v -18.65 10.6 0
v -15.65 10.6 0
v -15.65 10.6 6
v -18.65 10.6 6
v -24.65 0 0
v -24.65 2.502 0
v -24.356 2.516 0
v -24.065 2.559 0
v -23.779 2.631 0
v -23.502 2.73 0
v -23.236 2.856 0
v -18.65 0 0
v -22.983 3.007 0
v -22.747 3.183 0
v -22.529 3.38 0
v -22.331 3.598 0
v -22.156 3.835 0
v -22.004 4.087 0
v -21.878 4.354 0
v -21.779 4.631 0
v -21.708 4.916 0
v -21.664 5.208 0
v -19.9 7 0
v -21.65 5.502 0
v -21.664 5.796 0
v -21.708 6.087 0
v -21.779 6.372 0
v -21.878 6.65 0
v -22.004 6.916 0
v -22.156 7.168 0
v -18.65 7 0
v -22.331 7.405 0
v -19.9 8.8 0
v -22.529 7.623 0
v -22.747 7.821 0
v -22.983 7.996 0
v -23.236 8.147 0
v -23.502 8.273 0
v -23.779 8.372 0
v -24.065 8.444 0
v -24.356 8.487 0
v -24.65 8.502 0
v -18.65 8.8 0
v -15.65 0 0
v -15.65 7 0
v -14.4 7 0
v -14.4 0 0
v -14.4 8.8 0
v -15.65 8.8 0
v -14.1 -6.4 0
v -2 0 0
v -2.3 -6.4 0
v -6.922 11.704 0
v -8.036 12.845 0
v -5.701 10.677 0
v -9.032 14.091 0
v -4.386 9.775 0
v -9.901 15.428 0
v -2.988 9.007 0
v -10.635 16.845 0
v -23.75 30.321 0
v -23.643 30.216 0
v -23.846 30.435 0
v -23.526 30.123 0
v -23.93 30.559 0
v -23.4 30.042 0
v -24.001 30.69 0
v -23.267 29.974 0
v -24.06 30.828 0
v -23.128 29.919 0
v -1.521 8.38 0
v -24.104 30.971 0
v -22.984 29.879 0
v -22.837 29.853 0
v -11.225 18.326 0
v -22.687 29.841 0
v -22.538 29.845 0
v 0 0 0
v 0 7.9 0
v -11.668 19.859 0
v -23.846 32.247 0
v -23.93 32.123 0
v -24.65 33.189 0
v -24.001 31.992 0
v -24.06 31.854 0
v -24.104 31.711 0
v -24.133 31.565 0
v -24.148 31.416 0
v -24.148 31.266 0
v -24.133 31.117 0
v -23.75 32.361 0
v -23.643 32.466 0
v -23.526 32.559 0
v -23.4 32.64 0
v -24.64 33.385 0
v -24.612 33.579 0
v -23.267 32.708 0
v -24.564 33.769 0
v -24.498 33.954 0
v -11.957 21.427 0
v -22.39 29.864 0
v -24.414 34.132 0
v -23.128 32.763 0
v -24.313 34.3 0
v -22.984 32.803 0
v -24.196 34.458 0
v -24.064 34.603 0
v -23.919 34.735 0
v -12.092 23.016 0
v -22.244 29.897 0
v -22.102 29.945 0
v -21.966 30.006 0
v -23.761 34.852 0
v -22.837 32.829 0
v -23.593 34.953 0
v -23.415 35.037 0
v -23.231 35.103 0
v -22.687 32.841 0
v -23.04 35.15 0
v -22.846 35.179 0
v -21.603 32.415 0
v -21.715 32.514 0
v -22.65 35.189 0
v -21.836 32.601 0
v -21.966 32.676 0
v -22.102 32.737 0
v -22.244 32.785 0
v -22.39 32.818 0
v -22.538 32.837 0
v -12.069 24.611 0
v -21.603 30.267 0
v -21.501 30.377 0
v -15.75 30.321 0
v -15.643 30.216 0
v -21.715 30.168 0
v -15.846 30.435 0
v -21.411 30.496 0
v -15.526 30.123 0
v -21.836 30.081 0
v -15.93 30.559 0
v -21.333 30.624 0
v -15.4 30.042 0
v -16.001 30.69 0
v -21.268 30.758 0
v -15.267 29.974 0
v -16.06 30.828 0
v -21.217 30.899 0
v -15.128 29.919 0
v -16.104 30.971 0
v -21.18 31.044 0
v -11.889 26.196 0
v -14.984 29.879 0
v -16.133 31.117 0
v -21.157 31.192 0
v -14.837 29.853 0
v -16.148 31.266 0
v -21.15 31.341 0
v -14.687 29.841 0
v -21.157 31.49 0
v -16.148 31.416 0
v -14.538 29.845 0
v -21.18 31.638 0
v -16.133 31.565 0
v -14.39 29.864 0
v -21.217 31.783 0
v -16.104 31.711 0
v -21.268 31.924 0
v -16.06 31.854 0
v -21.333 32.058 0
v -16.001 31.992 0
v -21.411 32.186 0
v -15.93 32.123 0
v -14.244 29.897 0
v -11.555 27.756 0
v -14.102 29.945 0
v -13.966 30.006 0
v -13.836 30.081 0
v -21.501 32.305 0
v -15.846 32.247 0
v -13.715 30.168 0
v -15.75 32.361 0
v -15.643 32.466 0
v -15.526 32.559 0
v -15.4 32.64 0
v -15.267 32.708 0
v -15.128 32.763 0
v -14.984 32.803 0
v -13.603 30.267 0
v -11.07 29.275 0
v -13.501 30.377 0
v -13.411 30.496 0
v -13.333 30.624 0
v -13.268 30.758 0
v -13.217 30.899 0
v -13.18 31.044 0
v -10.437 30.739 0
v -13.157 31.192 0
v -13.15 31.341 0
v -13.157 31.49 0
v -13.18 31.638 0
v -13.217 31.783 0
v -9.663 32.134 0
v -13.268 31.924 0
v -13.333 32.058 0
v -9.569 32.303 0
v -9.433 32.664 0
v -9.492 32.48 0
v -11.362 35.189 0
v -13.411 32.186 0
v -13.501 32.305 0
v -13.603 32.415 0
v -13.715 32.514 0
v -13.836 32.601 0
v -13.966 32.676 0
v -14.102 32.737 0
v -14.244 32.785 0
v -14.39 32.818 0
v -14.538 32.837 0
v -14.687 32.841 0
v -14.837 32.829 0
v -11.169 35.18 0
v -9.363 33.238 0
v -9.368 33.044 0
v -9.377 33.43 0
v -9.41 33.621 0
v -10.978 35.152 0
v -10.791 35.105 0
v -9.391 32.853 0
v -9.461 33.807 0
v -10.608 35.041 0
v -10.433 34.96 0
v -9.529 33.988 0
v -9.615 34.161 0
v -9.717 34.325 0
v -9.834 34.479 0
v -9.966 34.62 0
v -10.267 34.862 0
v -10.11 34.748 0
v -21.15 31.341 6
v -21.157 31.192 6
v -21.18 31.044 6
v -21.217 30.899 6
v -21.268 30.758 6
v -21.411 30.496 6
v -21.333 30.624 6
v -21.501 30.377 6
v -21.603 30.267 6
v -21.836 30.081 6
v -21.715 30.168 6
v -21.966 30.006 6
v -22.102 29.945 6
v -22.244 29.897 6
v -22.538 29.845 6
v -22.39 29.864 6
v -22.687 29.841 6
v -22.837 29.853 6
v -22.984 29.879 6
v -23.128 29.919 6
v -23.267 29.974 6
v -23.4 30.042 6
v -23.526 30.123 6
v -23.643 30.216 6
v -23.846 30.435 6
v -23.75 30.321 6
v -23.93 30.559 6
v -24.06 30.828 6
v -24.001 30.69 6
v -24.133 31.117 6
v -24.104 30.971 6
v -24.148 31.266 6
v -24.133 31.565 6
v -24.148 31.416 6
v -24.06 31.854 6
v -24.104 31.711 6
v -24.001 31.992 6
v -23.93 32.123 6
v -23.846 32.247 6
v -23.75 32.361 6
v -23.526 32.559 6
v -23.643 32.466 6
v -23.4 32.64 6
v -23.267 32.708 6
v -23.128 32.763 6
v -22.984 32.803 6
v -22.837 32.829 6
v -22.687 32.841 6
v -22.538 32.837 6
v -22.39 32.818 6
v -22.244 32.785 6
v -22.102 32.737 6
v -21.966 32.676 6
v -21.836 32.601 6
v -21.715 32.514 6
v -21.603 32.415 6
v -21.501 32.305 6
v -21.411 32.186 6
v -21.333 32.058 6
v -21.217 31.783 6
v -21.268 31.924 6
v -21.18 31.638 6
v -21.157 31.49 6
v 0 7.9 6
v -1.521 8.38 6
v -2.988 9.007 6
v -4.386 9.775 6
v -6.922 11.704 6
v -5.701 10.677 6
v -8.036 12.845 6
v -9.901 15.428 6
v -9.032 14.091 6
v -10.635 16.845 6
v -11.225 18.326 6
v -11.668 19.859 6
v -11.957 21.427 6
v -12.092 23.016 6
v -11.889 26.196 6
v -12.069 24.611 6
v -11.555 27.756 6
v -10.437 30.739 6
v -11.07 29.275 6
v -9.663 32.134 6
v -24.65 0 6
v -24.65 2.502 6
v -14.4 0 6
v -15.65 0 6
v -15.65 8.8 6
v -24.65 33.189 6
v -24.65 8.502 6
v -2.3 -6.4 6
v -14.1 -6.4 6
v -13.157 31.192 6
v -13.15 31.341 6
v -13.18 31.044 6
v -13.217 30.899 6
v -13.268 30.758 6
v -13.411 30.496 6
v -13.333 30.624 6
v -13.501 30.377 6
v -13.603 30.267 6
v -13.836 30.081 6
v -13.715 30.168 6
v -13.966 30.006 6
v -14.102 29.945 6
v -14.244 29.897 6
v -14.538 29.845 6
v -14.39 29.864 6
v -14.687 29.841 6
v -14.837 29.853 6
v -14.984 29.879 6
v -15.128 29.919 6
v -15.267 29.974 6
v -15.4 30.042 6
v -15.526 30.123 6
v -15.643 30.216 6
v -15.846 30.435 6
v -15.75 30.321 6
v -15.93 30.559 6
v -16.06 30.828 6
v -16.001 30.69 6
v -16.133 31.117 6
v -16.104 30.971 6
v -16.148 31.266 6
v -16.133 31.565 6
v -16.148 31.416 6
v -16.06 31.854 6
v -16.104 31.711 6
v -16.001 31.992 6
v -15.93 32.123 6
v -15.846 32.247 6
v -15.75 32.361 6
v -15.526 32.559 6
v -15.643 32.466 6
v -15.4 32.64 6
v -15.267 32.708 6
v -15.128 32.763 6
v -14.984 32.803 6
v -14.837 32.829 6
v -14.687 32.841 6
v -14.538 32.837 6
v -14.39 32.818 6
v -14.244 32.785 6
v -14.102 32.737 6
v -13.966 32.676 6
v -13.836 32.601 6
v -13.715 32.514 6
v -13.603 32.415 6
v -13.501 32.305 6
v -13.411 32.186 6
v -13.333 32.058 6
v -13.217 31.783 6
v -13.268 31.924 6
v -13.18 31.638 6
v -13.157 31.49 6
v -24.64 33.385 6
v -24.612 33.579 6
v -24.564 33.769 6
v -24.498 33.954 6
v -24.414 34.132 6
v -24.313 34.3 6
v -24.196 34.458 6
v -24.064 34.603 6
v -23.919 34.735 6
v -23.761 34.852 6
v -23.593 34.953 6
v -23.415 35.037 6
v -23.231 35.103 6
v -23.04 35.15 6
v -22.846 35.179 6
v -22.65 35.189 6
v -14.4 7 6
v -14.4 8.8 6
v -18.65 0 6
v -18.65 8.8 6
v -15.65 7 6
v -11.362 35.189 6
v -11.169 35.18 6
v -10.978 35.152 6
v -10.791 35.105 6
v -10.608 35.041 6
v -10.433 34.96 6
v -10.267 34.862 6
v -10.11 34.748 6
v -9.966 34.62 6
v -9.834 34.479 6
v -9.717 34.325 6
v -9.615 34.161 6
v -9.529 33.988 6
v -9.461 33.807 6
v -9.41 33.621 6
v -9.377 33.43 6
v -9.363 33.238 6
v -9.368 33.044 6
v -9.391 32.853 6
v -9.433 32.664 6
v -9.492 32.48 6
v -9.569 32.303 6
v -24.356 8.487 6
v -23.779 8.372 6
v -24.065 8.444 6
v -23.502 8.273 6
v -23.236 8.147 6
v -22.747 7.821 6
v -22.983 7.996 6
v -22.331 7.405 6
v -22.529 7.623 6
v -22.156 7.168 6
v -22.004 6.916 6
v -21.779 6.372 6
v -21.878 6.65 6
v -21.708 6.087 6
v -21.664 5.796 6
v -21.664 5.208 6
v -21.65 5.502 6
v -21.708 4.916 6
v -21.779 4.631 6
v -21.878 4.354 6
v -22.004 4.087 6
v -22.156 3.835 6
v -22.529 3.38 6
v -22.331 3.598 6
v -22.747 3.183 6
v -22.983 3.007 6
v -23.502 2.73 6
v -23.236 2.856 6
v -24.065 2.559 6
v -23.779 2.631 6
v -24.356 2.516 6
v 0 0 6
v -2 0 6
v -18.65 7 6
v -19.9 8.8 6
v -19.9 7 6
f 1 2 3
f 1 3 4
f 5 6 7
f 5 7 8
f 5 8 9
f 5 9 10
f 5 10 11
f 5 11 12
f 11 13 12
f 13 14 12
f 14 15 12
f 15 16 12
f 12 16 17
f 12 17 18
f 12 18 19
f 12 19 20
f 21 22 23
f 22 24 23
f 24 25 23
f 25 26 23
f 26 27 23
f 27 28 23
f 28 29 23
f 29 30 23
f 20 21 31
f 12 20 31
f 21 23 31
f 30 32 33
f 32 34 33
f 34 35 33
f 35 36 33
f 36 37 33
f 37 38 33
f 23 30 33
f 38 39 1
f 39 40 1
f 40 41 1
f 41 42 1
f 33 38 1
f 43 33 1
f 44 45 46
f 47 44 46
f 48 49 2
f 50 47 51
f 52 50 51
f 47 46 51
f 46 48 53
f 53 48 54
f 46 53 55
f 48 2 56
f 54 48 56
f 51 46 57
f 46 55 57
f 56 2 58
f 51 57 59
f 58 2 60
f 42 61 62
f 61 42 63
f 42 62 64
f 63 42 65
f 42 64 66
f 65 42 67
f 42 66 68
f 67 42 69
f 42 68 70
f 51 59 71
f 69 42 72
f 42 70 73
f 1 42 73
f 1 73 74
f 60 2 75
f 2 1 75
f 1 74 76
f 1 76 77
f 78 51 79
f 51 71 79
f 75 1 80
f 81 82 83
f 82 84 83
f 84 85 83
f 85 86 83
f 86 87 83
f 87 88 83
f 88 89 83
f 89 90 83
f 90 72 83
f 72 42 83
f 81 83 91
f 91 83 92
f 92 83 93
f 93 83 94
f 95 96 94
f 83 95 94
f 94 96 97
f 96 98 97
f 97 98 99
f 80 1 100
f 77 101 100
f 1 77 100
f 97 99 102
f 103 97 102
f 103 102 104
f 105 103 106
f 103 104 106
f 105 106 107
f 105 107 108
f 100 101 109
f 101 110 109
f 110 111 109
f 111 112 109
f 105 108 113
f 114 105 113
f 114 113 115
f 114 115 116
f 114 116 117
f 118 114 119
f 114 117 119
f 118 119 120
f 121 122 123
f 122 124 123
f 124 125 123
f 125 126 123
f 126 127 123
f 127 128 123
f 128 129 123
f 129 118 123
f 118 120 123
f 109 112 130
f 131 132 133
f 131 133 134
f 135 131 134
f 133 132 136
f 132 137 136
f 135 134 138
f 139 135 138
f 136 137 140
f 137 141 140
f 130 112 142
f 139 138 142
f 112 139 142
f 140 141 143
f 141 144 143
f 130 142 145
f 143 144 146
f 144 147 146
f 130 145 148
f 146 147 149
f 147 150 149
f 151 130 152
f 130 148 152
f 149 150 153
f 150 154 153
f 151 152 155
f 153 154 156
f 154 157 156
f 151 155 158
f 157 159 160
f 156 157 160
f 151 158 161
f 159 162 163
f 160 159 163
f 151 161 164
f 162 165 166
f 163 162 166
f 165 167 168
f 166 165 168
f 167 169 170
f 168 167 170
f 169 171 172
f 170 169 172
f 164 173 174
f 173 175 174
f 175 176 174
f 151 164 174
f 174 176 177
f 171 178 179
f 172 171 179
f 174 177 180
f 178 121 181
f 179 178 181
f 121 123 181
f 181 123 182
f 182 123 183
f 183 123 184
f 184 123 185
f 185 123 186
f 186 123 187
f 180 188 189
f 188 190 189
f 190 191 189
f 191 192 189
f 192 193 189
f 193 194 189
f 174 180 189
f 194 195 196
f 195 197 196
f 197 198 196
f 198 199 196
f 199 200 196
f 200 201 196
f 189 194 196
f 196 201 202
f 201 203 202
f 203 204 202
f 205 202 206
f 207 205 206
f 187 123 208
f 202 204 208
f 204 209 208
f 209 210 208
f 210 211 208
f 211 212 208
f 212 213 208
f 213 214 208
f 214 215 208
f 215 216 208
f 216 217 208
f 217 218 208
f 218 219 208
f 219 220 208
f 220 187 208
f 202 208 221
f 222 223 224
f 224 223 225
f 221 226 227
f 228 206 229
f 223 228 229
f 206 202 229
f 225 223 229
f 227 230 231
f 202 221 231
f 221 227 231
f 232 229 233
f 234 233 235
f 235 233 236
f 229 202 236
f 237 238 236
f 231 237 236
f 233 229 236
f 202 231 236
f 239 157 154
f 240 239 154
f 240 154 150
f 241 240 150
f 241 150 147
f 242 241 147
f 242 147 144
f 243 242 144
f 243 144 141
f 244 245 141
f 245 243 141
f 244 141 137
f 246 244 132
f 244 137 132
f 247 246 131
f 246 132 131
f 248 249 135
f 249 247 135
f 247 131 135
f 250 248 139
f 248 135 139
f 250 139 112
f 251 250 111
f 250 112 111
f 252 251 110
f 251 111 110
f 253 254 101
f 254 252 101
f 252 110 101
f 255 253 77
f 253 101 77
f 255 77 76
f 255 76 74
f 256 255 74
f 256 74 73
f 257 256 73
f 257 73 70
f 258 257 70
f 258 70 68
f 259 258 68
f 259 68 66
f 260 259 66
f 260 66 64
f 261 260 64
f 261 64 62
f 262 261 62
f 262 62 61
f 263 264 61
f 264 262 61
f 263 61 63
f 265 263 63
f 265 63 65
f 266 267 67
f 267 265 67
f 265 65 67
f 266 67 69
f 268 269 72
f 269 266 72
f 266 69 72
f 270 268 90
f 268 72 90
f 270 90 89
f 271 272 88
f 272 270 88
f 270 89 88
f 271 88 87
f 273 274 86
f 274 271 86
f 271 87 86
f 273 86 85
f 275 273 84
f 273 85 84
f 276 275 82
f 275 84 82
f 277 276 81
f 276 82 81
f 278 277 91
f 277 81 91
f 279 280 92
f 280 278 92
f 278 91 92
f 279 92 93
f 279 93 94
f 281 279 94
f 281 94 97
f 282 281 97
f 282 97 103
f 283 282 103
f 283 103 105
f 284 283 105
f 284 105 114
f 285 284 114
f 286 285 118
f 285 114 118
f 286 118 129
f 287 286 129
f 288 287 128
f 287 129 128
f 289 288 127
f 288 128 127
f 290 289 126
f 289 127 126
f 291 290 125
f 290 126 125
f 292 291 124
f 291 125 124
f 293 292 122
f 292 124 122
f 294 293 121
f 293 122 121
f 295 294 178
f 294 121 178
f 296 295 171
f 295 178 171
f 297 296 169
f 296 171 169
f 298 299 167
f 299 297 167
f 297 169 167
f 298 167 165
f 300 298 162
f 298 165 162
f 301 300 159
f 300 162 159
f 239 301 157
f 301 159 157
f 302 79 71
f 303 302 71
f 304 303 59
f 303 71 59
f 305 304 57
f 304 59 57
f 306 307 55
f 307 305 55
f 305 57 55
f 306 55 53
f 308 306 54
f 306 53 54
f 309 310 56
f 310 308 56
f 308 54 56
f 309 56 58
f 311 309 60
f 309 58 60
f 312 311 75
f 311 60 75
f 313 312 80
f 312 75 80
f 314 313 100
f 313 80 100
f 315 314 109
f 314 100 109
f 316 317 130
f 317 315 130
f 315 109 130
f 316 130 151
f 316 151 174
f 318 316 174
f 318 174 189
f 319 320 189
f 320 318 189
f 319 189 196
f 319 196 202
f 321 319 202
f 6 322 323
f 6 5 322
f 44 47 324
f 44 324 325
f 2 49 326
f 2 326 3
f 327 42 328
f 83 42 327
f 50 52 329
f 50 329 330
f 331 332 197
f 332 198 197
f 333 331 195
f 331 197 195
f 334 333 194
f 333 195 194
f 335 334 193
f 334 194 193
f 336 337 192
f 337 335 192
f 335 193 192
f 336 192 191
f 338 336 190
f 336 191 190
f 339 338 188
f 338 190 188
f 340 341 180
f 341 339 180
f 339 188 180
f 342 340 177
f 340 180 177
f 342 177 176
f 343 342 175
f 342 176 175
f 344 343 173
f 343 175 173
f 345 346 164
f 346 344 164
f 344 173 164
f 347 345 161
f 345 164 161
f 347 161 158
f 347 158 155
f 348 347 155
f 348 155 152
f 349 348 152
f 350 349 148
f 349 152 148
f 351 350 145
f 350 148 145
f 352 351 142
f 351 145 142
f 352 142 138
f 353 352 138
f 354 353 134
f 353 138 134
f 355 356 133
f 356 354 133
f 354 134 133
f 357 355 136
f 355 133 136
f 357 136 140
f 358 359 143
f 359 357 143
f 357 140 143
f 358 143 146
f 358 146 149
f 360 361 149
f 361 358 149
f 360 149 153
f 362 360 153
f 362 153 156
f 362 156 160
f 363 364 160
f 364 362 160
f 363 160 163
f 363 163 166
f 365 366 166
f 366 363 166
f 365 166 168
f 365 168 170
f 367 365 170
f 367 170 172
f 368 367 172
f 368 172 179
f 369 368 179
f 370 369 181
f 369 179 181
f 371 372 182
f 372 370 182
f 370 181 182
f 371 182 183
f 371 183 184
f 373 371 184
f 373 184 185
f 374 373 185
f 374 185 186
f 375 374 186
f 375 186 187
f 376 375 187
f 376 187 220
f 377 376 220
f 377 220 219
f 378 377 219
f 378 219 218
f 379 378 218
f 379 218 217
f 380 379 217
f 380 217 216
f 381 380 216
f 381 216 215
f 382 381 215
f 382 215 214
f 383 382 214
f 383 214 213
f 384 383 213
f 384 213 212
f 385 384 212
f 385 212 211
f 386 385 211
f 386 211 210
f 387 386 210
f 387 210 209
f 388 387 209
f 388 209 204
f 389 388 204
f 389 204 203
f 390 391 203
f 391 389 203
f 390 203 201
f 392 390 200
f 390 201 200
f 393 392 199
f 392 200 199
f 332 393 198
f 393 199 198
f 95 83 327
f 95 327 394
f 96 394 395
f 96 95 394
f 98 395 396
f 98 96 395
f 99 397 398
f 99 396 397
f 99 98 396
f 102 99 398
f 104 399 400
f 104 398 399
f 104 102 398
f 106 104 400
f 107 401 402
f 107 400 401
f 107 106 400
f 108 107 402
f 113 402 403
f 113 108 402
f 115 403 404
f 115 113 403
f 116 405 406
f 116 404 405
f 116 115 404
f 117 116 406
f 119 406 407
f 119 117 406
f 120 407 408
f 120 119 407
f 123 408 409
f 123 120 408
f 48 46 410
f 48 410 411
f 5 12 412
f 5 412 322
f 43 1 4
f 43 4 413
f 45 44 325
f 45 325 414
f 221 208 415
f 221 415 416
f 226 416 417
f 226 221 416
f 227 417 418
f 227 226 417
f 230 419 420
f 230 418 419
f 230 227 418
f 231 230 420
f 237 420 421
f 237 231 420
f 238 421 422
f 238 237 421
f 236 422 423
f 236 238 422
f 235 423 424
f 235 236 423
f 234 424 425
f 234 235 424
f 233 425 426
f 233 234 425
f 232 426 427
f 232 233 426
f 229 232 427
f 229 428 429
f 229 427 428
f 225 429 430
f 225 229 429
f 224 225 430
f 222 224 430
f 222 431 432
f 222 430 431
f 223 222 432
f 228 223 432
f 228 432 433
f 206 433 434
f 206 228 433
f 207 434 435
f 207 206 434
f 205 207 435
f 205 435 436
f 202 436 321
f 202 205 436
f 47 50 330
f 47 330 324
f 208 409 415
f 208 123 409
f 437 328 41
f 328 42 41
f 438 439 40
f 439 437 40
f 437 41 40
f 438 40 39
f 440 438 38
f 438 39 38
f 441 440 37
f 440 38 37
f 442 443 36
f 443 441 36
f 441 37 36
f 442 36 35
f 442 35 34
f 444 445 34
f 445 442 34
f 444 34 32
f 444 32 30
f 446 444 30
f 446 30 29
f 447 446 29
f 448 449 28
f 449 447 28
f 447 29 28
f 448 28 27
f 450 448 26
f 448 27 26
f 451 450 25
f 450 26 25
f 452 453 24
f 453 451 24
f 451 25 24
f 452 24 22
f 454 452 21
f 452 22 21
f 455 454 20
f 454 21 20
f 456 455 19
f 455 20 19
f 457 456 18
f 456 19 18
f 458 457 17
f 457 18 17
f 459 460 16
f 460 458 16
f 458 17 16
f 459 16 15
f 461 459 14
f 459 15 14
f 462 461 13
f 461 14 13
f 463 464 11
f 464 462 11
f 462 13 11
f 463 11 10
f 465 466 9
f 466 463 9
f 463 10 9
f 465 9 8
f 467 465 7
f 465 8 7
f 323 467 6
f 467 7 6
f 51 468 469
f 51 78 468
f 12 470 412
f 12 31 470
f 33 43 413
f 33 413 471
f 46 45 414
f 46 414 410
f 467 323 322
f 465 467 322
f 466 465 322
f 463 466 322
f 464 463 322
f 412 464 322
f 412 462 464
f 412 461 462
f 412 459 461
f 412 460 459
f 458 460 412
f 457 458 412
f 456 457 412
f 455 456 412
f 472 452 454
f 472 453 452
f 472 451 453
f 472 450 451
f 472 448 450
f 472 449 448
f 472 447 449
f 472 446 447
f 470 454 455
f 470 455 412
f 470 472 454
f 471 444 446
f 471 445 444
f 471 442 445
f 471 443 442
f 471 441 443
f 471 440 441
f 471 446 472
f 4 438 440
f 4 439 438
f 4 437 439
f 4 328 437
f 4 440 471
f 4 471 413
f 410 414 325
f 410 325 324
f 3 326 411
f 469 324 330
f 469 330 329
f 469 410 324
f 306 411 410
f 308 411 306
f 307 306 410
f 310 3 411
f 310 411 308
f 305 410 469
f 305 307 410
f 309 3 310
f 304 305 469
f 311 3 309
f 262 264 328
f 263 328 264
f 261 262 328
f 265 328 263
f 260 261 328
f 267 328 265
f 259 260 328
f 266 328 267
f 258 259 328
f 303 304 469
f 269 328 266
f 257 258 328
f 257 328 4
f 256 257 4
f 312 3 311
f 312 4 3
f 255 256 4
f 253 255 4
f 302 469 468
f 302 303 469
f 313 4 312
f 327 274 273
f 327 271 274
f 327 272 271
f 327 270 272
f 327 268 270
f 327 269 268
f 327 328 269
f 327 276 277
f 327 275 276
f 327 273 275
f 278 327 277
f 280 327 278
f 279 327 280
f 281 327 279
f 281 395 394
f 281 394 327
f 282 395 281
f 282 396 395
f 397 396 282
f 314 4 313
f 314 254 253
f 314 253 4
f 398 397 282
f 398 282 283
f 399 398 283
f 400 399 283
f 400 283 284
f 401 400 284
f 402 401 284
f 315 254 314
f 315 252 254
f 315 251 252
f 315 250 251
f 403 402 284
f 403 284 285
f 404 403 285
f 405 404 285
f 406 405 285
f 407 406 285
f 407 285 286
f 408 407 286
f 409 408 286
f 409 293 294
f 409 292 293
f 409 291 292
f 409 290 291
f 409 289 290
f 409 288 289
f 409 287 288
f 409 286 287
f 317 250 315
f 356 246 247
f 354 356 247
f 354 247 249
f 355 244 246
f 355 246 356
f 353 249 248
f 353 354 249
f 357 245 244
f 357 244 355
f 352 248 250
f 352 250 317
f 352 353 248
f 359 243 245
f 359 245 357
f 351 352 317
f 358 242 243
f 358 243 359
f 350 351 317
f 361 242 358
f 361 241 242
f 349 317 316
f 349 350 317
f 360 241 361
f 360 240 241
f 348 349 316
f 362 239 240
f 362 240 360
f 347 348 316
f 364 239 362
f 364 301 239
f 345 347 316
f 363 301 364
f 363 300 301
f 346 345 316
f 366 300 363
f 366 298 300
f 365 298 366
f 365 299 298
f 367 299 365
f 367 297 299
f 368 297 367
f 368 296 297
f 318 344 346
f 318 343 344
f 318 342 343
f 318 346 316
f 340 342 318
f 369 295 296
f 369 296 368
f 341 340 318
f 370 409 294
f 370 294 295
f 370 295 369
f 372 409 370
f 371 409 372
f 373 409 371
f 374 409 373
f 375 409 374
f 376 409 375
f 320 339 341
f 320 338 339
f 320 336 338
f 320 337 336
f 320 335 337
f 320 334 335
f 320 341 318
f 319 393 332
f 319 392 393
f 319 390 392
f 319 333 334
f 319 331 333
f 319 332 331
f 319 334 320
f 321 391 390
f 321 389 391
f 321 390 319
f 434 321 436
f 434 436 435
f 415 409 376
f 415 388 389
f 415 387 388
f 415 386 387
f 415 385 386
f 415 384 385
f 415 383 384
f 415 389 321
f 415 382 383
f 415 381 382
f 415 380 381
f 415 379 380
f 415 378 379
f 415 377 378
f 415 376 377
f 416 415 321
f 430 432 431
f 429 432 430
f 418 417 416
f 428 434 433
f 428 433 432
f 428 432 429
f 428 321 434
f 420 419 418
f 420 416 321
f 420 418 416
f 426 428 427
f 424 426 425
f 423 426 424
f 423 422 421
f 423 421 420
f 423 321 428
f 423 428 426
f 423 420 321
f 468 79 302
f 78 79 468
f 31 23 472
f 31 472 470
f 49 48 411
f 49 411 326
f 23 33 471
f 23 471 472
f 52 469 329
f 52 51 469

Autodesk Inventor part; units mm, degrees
ref_plane "YZ Plane" through (0, 0, 0) normal (1, 0, 0) x (0, 1, 0)
ref_plane "XZ Plane" through (0, 0, 0) normal (0, 1, 0) x (-1, 0, 0)
ref_plane "XY Plane" through (0, 0, 0) normal (0, 0, 1) x (1, 0, 0)
sketch "Sketch1" plane through (0, 0, 0) normal (0, 0, 1) x (1, 0, 0)
  arc A0 (-22.65, 35.1889) -> (-24.65, 33.1889) centre (-22.65, 33.1889) ccw
  line L0 (-24.65, 8.5016) -> (-24.65, 33.1889)
  arc A1 (-24.65, 2.5016) -> (-24.65, 8.5016) centre (-24.65, 5.5016) ccw
  line L1 (-24.65, 0) -> (-24.65, 2.5016)
  line L2 (-18.65, 0) -> (-24.65, 0)
  line L3 (-18.65, 7) -> (-18.65, 0)
  line L4 (-19.9, 7) -> (-18.65, 7)
  line L5 (-19.9, 8.8) -> (-19.9, 7)
  line L6 (-18.65, 8.8) -> (-19.9, 8.8)
  line L7 (-18.65, 10.6) -> (-18.65, 8.8)
  line L8 (-15.65, 10.6) -> (-18.65, 10.6)
  line L9 (-15.65, 8.8) -> (-15.65, 10.6)
  line L10 (-14.4, 8.8) -> (-15.65, 8.8)
  line L11 (-14.4, 7) -> (-14.4, 8.8)
  line L12 (-15.65, 7) -> (-14.4, 7)
  line L13 (-15.65, 0) -> (-15.65, 7)
  line L14 (-14.4, 0) -> (-15.65, 0)
  line L15 (-14.1, -6.4) -> (-14.4, 0)
  line L16 (-2.3, -6.4) -> (-14.1, -6.4)
  line L17 (-2, 0) -> (-2.3, -6.4)
  line L18 (0, 0) -> (-2, 0)
  line L19 (0, 7.9) -> (0, 0)
  arc A2 (-9.6633, 32.1341) -> (0, 7.9) centre (4.112, 23.5833) ccw
  arc A3 (-9.6633, 32.1341) -> (-11.3625, 35.1889) centre (-11.3625, 33.1889) ccw
  line L20 (-22.65, 35.1889) -> (-11.3625, 35.1889)
  circle A4 centre (-14.65, 31.341) radius 1.5
  circle A5 centre (-22.65, 31.341) radius 1.5
extrude "Extrusion1" add sketch "Sketch1" along normal blind 6
properties part number "yCarWireHolder"
